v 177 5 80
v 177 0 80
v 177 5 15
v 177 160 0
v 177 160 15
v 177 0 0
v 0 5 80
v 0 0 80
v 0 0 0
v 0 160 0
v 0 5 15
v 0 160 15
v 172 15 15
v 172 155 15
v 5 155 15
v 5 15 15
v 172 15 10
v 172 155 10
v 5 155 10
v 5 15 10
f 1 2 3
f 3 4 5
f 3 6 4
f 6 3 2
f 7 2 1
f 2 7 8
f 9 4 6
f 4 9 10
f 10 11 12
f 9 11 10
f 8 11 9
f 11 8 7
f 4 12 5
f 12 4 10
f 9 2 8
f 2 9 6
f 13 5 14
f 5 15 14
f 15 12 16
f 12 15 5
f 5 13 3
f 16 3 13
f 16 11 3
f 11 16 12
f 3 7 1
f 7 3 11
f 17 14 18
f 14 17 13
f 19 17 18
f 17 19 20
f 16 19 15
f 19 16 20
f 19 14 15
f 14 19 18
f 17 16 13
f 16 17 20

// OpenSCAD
slotH=10;
slotW=167;
slotD=140;
Wall=5;
BoxH=80;
BoxW=slotW+(Wall*2);
BoxD=slotD+(Wall*4);
cutH=BoxH+10;
cutW=BoxW+10;
cutD=BoxD+10;


difference()
{
  cube([BoxW,BoxD,BoxH]);
  translate([-Wall,Wall,Wall+slotH]) cube([cutW,cutD,cutH]);
  translate([Wall,Wall*3,Wall*2]) cube([slotW,slotD,slotH]);
}
